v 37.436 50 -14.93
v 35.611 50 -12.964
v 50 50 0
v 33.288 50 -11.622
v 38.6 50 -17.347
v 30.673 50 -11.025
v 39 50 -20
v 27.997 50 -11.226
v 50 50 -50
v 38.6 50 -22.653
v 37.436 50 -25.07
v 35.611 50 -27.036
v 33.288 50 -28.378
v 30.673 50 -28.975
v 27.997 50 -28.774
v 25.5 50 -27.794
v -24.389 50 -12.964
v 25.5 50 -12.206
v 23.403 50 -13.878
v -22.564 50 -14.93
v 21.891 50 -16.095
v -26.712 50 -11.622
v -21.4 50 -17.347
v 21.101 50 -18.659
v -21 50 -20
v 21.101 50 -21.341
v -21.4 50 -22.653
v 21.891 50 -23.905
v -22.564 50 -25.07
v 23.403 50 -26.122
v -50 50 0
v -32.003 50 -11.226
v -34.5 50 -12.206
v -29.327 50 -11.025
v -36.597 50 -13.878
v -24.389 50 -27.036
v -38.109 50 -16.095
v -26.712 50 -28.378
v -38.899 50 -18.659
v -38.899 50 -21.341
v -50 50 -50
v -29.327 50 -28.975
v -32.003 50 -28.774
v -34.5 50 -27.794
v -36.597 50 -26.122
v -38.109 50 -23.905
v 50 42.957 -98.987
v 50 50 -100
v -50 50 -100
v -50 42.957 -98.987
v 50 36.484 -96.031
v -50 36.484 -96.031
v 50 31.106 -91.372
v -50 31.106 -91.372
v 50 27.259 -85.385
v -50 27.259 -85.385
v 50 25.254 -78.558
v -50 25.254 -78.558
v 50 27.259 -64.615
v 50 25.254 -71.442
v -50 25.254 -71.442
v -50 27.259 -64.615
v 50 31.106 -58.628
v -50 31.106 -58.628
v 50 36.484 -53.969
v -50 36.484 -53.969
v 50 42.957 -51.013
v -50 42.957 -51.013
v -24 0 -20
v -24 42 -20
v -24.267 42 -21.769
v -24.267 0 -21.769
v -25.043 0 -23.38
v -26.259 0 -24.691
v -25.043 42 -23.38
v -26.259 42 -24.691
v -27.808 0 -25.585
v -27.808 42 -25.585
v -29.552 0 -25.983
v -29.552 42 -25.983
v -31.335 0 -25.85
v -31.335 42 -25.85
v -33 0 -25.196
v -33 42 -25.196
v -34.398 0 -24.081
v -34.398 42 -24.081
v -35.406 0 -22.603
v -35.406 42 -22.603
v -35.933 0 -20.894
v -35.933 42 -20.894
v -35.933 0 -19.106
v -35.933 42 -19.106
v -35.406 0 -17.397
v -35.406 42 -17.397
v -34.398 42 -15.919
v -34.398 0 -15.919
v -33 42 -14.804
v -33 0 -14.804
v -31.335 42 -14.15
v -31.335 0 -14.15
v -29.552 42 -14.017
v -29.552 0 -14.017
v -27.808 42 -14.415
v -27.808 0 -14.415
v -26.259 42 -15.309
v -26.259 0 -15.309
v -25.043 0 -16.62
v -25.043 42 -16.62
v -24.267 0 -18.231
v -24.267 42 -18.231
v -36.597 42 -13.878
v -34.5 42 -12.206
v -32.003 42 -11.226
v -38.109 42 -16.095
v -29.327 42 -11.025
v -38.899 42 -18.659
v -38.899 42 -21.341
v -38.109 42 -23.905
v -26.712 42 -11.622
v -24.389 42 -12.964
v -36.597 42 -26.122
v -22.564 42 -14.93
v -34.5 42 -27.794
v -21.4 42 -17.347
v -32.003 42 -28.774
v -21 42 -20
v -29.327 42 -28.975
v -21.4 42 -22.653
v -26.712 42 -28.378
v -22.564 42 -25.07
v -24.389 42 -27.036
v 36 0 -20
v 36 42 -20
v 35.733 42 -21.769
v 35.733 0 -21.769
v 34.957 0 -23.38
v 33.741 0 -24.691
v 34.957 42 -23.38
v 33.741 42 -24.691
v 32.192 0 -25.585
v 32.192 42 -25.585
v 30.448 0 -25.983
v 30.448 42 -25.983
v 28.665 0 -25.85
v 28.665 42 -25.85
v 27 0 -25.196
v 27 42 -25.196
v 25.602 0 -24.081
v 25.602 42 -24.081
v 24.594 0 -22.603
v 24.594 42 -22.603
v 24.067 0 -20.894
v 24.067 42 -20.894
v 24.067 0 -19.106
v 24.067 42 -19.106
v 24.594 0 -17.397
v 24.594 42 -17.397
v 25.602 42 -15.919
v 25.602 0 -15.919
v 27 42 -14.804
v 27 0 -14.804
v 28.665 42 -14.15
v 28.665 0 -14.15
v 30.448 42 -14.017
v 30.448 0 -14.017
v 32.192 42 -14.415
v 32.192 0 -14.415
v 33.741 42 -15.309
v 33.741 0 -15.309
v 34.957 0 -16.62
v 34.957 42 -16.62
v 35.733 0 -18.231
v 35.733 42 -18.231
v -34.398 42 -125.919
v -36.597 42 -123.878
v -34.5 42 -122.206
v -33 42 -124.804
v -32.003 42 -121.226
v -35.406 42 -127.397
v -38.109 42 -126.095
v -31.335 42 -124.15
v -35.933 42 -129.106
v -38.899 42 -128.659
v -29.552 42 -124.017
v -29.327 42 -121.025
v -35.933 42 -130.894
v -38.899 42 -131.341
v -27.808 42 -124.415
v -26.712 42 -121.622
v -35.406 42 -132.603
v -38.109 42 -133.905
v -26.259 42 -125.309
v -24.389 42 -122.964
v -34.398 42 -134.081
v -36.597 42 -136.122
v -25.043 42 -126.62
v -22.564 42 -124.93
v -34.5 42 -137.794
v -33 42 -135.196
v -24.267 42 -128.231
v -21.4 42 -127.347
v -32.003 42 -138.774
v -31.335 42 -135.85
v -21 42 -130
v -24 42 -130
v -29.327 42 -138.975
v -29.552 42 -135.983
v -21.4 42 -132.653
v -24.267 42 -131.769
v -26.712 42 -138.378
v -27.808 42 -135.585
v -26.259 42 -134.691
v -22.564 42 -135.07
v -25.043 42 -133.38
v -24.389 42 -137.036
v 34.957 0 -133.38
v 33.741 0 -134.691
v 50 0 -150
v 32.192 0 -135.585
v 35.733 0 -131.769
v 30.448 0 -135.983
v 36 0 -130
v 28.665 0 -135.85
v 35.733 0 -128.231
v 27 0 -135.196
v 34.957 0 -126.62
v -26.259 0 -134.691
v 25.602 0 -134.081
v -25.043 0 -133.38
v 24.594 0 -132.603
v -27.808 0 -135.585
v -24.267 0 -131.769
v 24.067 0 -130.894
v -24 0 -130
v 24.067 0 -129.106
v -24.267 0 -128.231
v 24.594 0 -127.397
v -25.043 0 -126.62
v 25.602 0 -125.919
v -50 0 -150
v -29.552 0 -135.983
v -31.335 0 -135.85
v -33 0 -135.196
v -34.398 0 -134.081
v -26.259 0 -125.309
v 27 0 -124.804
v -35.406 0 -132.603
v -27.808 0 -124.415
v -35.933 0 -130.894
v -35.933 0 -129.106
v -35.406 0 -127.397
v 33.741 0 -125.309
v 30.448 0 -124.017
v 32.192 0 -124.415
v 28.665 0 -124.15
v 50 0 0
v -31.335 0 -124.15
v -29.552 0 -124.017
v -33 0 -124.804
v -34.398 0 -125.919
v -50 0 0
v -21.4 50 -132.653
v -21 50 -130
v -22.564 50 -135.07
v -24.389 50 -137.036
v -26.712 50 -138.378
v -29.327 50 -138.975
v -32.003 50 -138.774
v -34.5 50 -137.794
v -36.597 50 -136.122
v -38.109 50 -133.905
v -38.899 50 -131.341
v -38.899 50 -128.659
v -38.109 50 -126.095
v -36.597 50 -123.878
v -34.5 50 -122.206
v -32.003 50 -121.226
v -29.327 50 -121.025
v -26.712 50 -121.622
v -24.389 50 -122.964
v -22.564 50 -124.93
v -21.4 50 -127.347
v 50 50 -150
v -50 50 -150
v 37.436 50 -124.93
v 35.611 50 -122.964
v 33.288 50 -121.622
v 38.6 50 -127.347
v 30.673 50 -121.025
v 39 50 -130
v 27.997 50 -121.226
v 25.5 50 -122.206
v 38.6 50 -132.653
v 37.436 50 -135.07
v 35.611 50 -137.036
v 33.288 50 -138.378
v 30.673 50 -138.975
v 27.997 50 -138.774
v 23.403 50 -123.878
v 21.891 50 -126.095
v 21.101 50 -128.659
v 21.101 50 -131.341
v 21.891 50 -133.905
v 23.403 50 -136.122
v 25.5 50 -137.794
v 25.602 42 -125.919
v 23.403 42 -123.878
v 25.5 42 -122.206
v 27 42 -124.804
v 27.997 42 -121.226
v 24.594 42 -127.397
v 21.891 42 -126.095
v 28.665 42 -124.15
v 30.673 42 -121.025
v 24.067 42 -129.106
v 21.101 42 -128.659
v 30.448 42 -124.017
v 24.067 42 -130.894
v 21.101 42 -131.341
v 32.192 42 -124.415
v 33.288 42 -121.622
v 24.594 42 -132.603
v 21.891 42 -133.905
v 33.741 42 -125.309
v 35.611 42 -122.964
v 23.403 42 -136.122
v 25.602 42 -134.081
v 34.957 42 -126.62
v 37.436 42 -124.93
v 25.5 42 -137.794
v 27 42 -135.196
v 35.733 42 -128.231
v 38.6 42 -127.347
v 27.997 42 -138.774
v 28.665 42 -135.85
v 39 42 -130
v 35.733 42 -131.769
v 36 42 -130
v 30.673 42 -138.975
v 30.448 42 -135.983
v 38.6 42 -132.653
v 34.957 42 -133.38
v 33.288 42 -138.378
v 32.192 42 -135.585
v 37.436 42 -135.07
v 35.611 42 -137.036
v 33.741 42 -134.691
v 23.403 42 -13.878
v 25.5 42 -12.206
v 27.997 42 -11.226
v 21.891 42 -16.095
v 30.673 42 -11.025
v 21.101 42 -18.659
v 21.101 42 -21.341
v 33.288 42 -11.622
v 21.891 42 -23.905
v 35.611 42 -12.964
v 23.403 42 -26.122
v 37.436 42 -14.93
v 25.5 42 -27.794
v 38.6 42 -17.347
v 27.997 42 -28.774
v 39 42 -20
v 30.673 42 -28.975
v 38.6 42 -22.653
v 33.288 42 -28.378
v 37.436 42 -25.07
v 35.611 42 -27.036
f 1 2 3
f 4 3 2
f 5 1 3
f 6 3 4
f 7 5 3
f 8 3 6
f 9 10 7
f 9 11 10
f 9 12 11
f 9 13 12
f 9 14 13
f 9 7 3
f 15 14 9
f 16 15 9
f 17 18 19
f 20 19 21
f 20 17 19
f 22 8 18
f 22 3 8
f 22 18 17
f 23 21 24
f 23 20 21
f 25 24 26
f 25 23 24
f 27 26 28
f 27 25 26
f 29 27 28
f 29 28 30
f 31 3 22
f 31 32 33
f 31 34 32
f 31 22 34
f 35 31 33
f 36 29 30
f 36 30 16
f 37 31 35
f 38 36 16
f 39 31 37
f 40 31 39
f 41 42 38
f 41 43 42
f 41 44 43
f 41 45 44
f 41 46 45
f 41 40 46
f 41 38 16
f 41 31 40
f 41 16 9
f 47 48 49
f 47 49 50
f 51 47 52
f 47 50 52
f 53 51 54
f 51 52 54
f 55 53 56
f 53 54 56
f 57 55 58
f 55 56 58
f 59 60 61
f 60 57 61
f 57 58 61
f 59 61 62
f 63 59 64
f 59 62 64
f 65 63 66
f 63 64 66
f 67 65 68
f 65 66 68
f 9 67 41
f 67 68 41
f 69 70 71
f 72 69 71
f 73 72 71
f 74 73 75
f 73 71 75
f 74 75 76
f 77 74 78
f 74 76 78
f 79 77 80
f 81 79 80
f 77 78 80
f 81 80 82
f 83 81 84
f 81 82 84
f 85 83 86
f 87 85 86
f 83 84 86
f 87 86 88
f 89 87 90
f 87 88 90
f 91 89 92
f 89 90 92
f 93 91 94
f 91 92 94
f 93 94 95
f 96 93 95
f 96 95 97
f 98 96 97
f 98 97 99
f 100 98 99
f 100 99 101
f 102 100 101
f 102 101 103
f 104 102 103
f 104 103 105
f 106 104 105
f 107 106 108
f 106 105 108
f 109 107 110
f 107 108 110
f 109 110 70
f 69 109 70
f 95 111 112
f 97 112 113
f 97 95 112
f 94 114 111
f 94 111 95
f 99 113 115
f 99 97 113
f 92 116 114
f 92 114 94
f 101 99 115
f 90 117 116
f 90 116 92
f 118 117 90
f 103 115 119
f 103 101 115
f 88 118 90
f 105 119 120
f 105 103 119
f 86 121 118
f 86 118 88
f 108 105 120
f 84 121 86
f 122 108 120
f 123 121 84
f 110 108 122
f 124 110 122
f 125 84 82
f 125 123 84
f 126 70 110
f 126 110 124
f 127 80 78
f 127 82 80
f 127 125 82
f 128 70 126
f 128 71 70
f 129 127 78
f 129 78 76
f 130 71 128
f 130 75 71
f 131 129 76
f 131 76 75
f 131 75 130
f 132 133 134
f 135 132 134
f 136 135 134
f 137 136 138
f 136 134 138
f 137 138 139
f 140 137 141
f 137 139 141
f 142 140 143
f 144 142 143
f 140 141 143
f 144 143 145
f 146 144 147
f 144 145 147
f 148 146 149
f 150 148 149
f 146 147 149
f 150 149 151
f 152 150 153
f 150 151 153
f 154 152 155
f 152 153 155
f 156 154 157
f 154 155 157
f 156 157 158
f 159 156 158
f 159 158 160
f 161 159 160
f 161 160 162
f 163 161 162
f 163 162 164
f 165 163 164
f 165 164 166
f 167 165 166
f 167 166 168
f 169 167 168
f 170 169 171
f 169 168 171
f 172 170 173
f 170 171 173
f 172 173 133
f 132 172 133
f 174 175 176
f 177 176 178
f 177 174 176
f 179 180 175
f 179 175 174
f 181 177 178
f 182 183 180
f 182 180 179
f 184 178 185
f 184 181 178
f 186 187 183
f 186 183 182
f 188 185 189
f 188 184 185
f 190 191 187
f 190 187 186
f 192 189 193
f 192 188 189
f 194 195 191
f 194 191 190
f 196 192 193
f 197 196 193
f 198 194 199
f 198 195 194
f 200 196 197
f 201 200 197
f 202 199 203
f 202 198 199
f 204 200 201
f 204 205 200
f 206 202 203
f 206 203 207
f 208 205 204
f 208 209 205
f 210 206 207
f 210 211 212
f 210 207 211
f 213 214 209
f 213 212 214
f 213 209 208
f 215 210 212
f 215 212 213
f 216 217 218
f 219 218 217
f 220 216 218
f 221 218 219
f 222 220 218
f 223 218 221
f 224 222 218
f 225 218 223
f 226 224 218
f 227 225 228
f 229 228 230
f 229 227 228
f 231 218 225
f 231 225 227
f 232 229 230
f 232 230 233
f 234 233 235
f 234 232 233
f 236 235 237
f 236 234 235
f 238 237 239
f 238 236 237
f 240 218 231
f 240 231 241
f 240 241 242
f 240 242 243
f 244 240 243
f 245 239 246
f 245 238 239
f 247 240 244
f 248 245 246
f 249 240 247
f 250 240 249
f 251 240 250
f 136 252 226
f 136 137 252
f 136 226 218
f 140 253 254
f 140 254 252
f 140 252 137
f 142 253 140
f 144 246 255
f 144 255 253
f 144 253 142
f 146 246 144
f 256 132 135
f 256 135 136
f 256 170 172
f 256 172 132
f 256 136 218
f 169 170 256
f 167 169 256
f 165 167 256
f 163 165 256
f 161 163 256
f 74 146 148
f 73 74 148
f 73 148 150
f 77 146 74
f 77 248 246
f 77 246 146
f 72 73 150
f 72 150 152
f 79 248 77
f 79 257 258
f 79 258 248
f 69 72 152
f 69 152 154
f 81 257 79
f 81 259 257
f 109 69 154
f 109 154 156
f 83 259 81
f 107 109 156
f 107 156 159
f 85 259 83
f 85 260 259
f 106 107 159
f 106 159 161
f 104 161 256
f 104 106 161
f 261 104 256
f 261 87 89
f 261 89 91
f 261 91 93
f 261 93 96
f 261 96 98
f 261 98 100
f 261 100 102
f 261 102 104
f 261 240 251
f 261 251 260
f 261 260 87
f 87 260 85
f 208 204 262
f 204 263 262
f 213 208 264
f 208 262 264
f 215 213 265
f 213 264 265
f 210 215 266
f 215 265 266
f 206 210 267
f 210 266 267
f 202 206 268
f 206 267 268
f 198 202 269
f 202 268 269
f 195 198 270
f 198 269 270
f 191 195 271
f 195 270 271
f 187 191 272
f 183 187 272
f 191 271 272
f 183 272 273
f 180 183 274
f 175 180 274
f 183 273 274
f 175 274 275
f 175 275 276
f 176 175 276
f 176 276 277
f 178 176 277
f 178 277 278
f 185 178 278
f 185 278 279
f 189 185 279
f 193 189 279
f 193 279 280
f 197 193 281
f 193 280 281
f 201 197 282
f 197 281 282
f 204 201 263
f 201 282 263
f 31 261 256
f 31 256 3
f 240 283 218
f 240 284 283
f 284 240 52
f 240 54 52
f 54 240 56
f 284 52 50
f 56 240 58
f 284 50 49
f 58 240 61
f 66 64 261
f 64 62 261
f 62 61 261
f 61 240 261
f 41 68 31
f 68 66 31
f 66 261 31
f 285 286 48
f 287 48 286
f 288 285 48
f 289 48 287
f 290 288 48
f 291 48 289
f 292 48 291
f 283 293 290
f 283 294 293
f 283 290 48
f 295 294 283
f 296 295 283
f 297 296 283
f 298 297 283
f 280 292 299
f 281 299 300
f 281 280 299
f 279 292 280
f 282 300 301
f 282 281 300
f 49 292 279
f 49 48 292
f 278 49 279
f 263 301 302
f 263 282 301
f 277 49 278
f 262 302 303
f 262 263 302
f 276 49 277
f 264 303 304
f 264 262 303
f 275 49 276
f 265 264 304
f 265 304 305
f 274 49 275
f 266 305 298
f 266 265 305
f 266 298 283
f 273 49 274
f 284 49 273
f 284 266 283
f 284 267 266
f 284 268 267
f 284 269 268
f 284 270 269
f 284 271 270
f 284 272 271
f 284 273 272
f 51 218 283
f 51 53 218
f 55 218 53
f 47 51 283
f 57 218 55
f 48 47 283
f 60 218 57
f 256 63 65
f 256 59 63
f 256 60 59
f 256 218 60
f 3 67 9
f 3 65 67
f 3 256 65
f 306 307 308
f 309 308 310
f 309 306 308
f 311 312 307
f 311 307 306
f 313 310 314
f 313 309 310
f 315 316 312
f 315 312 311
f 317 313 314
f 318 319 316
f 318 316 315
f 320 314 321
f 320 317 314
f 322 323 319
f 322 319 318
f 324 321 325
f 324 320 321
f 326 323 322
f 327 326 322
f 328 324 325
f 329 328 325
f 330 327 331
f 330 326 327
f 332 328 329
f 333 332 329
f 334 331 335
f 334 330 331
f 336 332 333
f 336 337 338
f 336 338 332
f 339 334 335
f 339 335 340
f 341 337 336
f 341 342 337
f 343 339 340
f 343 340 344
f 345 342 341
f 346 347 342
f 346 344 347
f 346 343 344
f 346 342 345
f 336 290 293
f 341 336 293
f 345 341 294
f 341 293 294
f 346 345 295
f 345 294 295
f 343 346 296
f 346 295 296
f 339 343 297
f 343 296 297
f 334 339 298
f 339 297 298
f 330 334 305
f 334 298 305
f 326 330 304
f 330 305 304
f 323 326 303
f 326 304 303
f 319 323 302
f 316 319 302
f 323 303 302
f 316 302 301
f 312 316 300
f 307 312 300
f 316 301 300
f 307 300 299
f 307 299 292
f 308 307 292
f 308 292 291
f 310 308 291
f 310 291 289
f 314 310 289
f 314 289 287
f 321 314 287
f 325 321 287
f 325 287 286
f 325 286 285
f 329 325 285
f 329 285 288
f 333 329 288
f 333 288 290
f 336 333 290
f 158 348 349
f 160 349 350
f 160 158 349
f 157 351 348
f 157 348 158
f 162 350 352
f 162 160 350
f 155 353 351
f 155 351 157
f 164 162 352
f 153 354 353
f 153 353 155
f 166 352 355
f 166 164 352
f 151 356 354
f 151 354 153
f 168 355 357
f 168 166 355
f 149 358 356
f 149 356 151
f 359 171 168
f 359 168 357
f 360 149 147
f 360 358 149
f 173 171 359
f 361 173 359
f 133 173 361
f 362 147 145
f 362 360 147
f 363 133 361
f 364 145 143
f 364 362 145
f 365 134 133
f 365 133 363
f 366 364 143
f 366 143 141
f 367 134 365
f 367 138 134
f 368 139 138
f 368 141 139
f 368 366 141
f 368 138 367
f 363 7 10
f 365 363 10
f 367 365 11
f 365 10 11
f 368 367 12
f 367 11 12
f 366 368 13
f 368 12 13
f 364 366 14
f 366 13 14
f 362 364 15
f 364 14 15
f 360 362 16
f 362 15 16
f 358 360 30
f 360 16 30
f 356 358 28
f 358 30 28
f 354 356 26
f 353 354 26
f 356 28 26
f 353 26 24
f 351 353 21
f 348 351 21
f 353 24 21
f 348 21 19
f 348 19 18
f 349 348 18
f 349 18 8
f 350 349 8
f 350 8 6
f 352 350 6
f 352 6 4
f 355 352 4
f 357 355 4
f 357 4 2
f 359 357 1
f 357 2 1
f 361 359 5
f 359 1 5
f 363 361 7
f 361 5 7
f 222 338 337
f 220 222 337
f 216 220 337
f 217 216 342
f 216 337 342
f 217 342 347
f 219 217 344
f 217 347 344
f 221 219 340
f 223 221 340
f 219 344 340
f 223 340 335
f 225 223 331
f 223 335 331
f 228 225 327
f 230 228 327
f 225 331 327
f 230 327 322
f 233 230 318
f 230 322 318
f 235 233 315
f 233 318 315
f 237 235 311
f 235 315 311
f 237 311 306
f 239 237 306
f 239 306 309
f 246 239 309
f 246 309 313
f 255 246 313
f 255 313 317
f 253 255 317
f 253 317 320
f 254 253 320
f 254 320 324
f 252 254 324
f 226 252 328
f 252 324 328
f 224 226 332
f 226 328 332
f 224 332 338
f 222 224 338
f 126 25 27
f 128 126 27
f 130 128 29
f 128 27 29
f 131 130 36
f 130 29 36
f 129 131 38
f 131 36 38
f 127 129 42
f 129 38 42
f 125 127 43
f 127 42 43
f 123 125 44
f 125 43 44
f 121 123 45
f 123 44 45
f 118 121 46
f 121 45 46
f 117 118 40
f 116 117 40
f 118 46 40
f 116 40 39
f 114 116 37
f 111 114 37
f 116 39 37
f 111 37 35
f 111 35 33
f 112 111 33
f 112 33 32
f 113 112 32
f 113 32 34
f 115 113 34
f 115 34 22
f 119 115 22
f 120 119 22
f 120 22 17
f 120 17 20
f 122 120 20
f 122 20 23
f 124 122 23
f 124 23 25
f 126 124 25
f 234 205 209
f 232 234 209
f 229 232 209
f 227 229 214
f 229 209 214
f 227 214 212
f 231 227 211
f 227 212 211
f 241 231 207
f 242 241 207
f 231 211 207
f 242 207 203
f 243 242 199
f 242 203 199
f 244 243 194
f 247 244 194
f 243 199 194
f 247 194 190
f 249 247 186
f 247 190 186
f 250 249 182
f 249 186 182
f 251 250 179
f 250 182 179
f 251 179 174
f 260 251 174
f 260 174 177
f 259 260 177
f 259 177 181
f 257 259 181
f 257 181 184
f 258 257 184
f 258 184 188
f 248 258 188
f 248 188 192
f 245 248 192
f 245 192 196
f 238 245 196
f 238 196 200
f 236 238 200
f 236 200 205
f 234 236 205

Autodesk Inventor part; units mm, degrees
ref_plane "YZ Plane" through (0, 0, 0) normal (1, 0, 0) x (0, 1, 0)
ref_plane "XZ Plane" through (0, 0, 0) normal (0, 1, 0) x (-1, 0, 0)
ref_plane "XY Plane" through (0, 0, 0) normal (0, 0, 1) x (1, 0, 0)
sketch "Sketch1" plane through (0, 0, 0) normal (1, 0, 0) x (0, 1, 0)
  line L0 (0, 0) -> (50, 0)
  line L1 (50, -150) -> (0, -150)
  line L2 (0, -150) -> (0, 0)
  arc A0 (50, -50) -> (50, -100) centre (50, -75) ccw
  line L3 (50, 0) -> (50, -50)
  line L4 (50, -100) -> (50, -150)
  dimension "d0" = 150
  dimension "d2" = 50
  dimension "d3" = 50
extrude "Extrusion1" add sketch "Sketch1" along normal mid plane 100
sketch "Sketch2" plane through (-50, 50, 0) normal (0, 1, 0) x (1, 0, 0)
  circle A0 centre (20, 20) radius 6
  circle A1 centre (20, 20) radius 9
  line L0 (0, 0) -> (100, 0) projected
  line L1 (0, 0) -> (0, 50) projected
  point P0 (50, 0)
  dimension "d6" = 18
  dimension "d7" = 12
  dimension "d8" = 20
  dimension "d9" = 20
extrude "Extrusion2" cut sketch "Sketch2" against normal through all contours A0
extrude "Extrusion3" cut sketch "Sketch2" against normal blind 8 contours A0 | A1
pattern_linear "Rectangular Pattern1" count 2 spacing 110 along (0, 0, -1) count 2 spacing 60 along (1, 0, 0) of "Extrusion3", "Extrusion2"
properties part number "Partdia16"
